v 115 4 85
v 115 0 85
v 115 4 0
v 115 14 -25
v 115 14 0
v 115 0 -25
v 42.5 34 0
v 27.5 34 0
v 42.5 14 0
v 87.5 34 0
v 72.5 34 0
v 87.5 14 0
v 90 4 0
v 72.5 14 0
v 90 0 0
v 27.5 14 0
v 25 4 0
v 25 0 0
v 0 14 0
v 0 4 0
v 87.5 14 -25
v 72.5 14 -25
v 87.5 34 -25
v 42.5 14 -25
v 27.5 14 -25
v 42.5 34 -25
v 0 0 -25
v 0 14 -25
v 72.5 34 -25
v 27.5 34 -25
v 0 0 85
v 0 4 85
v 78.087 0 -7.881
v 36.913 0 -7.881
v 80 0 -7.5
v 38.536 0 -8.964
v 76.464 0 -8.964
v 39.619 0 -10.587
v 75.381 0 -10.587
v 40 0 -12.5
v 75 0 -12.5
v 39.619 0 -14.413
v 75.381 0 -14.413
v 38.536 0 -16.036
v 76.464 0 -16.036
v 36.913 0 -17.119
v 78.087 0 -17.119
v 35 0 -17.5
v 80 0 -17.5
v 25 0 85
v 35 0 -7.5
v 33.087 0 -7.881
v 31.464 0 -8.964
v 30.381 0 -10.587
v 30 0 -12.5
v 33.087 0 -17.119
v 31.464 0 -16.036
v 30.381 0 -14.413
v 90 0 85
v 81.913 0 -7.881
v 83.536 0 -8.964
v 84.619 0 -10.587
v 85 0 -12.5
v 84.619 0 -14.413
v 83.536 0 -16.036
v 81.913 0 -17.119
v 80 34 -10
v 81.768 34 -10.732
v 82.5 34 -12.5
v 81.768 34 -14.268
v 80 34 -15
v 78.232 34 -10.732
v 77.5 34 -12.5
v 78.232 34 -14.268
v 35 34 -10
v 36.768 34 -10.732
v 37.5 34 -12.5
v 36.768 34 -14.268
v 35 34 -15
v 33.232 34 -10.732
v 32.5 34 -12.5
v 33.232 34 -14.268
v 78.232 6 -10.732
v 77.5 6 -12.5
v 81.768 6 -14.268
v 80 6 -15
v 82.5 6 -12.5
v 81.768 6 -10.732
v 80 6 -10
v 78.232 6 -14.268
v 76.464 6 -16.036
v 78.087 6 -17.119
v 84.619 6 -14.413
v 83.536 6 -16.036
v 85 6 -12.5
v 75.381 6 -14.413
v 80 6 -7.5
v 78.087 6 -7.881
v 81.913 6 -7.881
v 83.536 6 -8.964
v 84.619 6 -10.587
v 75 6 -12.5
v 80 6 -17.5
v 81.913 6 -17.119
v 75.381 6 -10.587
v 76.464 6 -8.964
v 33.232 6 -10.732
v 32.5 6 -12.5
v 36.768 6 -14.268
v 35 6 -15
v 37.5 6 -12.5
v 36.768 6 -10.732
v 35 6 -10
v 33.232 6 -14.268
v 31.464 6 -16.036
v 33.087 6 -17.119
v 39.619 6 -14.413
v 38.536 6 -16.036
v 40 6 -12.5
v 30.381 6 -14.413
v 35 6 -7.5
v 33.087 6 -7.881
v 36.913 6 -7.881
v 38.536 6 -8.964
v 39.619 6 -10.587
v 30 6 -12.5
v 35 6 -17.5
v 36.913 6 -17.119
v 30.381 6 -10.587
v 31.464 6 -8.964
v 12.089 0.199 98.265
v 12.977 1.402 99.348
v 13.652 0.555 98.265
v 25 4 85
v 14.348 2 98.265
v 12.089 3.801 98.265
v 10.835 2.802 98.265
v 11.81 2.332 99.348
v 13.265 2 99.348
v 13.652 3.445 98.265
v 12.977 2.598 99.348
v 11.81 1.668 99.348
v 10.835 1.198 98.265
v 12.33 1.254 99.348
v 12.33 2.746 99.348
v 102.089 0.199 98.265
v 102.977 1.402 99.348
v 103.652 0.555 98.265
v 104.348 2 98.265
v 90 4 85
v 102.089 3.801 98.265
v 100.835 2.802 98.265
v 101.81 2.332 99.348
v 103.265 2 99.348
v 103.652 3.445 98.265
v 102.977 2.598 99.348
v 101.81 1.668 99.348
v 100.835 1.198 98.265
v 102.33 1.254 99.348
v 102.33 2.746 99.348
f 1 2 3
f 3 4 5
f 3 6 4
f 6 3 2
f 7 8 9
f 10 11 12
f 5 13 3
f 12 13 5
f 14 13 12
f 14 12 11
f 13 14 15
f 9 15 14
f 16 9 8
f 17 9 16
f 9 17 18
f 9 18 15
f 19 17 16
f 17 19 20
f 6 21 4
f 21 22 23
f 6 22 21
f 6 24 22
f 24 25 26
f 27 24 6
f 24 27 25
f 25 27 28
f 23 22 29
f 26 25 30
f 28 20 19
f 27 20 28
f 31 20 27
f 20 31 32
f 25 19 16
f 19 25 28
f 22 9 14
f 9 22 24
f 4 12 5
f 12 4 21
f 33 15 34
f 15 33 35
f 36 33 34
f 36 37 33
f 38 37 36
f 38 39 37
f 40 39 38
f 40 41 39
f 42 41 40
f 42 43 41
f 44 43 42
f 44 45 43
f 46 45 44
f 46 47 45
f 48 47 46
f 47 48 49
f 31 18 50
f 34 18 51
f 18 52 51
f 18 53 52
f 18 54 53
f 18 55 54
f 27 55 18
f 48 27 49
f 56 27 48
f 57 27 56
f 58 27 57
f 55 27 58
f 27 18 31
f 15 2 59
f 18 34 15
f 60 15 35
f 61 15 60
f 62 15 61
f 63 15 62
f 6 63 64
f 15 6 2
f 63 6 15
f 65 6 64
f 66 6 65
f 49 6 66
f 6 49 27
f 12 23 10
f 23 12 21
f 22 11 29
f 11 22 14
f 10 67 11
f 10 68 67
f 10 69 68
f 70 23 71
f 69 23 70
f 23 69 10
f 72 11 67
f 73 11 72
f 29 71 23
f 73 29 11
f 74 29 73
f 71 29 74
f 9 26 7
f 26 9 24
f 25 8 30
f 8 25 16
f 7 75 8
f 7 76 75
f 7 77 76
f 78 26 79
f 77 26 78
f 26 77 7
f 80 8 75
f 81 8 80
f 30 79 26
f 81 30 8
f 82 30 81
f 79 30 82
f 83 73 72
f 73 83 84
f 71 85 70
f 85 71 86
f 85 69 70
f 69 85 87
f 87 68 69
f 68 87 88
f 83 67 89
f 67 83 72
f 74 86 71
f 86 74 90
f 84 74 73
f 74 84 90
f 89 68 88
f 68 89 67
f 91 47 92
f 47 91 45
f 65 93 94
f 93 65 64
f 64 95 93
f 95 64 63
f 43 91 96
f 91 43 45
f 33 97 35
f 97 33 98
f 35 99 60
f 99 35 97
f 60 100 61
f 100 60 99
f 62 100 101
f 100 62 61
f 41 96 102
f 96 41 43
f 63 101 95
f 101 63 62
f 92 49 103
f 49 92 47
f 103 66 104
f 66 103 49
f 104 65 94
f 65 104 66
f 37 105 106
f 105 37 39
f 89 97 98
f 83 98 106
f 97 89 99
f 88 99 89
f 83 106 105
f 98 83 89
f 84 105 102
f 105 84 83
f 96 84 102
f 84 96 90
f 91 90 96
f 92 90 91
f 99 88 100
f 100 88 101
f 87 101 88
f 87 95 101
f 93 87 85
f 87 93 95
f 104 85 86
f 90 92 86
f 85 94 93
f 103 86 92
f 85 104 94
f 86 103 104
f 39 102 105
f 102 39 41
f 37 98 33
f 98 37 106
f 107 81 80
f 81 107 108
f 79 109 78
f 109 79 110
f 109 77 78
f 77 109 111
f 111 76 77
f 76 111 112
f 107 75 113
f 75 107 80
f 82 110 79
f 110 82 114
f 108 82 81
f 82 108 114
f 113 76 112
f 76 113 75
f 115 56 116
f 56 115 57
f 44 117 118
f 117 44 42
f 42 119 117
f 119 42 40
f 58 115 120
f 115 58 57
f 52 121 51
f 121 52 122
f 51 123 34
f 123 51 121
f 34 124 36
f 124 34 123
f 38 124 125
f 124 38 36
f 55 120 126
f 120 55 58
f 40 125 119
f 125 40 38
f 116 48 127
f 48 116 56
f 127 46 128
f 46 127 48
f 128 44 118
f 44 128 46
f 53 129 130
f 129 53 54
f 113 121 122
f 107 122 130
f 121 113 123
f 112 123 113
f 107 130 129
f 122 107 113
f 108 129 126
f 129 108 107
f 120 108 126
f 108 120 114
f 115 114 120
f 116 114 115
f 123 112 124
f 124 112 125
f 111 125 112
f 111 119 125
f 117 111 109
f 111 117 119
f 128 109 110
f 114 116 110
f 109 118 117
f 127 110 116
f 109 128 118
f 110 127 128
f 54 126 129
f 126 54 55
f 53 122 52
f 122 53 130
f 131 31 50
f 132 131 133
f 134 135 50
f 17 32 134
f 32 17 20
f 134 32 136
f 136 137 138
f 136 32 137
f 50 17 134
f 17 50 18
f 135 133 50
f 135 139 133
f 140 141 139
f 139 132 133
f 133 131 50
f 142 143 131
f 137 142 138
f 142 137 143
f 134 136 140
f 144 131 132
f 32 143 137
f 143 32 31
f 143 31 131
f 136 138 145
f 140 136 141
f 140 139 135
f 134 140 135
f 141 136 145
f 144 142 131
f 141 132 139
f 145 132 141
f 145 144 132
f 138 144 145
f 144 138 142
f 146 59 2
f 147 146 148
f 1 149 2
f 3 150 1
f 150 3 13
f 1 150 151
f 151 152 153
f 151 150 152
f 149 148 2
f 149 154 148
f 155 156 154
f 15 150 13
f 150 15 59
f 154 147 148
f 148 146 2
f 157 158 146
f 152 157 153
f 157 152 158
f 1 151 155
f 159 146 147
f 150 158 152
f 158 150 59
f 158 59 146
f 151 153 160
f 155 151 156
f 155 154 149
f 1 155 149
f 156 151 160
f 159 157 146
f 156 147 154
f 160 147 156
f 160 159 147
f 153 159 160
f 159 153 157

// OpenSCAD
stud_d=4;
stud_h=85;
stud_w=25;
base_d=10+stud_d;
base_h=25;
stud_distance=90;

base_w = stud_distance+stud_w;

extension_d=20;
extension_h=base_h;
extension_w=15;
hole_distance=45;
hole_dia=5;
head_dia=10;
head_d=6;

module stud() {
 hull() { 
  cube([stud_w, stud_d, stud_h]);
  translate([0.5*stud_w, 0.5*stud_d, stud_h+0.5*stud_w]) sphere(d=stud_d);
 }
  //translate([0.5*stud_w, 0, stud_h]) rotate([-90, 0, 0]) cylinder(h=stud_d, d=stud_w);

}

module extension() {
  cube([extension_w, extension_d, extension_h]);

}

module screw_hole() {
  translate([0.5*base_w, 0, -0.5*base_h])
    rotate([-90, 0, 0]) {
        cylinder(h=base_d+extension_d, d=hole_dia);
        cylinder(h=head_d, d=head_dia);
    }
}

module base() {
  
  cube([base_w, base_d, base_h]);
  translate([0.5*(base_w-extension_w+hole_distance), base_d, 0]) extension();
  translate([0.5*(base_w-extension_w-hole_distance), base_d, 0]) extension();
}

difference() {
  translate([0, 0, -base_h]) base();
  translate([0.5*hole_distance, 0, 0]) screw_hole();
  translate([-0.5*hole_distance, 0, 0]) screw_hole();
}
stud();
translate([stud_distance, 0, 0]) stud();
